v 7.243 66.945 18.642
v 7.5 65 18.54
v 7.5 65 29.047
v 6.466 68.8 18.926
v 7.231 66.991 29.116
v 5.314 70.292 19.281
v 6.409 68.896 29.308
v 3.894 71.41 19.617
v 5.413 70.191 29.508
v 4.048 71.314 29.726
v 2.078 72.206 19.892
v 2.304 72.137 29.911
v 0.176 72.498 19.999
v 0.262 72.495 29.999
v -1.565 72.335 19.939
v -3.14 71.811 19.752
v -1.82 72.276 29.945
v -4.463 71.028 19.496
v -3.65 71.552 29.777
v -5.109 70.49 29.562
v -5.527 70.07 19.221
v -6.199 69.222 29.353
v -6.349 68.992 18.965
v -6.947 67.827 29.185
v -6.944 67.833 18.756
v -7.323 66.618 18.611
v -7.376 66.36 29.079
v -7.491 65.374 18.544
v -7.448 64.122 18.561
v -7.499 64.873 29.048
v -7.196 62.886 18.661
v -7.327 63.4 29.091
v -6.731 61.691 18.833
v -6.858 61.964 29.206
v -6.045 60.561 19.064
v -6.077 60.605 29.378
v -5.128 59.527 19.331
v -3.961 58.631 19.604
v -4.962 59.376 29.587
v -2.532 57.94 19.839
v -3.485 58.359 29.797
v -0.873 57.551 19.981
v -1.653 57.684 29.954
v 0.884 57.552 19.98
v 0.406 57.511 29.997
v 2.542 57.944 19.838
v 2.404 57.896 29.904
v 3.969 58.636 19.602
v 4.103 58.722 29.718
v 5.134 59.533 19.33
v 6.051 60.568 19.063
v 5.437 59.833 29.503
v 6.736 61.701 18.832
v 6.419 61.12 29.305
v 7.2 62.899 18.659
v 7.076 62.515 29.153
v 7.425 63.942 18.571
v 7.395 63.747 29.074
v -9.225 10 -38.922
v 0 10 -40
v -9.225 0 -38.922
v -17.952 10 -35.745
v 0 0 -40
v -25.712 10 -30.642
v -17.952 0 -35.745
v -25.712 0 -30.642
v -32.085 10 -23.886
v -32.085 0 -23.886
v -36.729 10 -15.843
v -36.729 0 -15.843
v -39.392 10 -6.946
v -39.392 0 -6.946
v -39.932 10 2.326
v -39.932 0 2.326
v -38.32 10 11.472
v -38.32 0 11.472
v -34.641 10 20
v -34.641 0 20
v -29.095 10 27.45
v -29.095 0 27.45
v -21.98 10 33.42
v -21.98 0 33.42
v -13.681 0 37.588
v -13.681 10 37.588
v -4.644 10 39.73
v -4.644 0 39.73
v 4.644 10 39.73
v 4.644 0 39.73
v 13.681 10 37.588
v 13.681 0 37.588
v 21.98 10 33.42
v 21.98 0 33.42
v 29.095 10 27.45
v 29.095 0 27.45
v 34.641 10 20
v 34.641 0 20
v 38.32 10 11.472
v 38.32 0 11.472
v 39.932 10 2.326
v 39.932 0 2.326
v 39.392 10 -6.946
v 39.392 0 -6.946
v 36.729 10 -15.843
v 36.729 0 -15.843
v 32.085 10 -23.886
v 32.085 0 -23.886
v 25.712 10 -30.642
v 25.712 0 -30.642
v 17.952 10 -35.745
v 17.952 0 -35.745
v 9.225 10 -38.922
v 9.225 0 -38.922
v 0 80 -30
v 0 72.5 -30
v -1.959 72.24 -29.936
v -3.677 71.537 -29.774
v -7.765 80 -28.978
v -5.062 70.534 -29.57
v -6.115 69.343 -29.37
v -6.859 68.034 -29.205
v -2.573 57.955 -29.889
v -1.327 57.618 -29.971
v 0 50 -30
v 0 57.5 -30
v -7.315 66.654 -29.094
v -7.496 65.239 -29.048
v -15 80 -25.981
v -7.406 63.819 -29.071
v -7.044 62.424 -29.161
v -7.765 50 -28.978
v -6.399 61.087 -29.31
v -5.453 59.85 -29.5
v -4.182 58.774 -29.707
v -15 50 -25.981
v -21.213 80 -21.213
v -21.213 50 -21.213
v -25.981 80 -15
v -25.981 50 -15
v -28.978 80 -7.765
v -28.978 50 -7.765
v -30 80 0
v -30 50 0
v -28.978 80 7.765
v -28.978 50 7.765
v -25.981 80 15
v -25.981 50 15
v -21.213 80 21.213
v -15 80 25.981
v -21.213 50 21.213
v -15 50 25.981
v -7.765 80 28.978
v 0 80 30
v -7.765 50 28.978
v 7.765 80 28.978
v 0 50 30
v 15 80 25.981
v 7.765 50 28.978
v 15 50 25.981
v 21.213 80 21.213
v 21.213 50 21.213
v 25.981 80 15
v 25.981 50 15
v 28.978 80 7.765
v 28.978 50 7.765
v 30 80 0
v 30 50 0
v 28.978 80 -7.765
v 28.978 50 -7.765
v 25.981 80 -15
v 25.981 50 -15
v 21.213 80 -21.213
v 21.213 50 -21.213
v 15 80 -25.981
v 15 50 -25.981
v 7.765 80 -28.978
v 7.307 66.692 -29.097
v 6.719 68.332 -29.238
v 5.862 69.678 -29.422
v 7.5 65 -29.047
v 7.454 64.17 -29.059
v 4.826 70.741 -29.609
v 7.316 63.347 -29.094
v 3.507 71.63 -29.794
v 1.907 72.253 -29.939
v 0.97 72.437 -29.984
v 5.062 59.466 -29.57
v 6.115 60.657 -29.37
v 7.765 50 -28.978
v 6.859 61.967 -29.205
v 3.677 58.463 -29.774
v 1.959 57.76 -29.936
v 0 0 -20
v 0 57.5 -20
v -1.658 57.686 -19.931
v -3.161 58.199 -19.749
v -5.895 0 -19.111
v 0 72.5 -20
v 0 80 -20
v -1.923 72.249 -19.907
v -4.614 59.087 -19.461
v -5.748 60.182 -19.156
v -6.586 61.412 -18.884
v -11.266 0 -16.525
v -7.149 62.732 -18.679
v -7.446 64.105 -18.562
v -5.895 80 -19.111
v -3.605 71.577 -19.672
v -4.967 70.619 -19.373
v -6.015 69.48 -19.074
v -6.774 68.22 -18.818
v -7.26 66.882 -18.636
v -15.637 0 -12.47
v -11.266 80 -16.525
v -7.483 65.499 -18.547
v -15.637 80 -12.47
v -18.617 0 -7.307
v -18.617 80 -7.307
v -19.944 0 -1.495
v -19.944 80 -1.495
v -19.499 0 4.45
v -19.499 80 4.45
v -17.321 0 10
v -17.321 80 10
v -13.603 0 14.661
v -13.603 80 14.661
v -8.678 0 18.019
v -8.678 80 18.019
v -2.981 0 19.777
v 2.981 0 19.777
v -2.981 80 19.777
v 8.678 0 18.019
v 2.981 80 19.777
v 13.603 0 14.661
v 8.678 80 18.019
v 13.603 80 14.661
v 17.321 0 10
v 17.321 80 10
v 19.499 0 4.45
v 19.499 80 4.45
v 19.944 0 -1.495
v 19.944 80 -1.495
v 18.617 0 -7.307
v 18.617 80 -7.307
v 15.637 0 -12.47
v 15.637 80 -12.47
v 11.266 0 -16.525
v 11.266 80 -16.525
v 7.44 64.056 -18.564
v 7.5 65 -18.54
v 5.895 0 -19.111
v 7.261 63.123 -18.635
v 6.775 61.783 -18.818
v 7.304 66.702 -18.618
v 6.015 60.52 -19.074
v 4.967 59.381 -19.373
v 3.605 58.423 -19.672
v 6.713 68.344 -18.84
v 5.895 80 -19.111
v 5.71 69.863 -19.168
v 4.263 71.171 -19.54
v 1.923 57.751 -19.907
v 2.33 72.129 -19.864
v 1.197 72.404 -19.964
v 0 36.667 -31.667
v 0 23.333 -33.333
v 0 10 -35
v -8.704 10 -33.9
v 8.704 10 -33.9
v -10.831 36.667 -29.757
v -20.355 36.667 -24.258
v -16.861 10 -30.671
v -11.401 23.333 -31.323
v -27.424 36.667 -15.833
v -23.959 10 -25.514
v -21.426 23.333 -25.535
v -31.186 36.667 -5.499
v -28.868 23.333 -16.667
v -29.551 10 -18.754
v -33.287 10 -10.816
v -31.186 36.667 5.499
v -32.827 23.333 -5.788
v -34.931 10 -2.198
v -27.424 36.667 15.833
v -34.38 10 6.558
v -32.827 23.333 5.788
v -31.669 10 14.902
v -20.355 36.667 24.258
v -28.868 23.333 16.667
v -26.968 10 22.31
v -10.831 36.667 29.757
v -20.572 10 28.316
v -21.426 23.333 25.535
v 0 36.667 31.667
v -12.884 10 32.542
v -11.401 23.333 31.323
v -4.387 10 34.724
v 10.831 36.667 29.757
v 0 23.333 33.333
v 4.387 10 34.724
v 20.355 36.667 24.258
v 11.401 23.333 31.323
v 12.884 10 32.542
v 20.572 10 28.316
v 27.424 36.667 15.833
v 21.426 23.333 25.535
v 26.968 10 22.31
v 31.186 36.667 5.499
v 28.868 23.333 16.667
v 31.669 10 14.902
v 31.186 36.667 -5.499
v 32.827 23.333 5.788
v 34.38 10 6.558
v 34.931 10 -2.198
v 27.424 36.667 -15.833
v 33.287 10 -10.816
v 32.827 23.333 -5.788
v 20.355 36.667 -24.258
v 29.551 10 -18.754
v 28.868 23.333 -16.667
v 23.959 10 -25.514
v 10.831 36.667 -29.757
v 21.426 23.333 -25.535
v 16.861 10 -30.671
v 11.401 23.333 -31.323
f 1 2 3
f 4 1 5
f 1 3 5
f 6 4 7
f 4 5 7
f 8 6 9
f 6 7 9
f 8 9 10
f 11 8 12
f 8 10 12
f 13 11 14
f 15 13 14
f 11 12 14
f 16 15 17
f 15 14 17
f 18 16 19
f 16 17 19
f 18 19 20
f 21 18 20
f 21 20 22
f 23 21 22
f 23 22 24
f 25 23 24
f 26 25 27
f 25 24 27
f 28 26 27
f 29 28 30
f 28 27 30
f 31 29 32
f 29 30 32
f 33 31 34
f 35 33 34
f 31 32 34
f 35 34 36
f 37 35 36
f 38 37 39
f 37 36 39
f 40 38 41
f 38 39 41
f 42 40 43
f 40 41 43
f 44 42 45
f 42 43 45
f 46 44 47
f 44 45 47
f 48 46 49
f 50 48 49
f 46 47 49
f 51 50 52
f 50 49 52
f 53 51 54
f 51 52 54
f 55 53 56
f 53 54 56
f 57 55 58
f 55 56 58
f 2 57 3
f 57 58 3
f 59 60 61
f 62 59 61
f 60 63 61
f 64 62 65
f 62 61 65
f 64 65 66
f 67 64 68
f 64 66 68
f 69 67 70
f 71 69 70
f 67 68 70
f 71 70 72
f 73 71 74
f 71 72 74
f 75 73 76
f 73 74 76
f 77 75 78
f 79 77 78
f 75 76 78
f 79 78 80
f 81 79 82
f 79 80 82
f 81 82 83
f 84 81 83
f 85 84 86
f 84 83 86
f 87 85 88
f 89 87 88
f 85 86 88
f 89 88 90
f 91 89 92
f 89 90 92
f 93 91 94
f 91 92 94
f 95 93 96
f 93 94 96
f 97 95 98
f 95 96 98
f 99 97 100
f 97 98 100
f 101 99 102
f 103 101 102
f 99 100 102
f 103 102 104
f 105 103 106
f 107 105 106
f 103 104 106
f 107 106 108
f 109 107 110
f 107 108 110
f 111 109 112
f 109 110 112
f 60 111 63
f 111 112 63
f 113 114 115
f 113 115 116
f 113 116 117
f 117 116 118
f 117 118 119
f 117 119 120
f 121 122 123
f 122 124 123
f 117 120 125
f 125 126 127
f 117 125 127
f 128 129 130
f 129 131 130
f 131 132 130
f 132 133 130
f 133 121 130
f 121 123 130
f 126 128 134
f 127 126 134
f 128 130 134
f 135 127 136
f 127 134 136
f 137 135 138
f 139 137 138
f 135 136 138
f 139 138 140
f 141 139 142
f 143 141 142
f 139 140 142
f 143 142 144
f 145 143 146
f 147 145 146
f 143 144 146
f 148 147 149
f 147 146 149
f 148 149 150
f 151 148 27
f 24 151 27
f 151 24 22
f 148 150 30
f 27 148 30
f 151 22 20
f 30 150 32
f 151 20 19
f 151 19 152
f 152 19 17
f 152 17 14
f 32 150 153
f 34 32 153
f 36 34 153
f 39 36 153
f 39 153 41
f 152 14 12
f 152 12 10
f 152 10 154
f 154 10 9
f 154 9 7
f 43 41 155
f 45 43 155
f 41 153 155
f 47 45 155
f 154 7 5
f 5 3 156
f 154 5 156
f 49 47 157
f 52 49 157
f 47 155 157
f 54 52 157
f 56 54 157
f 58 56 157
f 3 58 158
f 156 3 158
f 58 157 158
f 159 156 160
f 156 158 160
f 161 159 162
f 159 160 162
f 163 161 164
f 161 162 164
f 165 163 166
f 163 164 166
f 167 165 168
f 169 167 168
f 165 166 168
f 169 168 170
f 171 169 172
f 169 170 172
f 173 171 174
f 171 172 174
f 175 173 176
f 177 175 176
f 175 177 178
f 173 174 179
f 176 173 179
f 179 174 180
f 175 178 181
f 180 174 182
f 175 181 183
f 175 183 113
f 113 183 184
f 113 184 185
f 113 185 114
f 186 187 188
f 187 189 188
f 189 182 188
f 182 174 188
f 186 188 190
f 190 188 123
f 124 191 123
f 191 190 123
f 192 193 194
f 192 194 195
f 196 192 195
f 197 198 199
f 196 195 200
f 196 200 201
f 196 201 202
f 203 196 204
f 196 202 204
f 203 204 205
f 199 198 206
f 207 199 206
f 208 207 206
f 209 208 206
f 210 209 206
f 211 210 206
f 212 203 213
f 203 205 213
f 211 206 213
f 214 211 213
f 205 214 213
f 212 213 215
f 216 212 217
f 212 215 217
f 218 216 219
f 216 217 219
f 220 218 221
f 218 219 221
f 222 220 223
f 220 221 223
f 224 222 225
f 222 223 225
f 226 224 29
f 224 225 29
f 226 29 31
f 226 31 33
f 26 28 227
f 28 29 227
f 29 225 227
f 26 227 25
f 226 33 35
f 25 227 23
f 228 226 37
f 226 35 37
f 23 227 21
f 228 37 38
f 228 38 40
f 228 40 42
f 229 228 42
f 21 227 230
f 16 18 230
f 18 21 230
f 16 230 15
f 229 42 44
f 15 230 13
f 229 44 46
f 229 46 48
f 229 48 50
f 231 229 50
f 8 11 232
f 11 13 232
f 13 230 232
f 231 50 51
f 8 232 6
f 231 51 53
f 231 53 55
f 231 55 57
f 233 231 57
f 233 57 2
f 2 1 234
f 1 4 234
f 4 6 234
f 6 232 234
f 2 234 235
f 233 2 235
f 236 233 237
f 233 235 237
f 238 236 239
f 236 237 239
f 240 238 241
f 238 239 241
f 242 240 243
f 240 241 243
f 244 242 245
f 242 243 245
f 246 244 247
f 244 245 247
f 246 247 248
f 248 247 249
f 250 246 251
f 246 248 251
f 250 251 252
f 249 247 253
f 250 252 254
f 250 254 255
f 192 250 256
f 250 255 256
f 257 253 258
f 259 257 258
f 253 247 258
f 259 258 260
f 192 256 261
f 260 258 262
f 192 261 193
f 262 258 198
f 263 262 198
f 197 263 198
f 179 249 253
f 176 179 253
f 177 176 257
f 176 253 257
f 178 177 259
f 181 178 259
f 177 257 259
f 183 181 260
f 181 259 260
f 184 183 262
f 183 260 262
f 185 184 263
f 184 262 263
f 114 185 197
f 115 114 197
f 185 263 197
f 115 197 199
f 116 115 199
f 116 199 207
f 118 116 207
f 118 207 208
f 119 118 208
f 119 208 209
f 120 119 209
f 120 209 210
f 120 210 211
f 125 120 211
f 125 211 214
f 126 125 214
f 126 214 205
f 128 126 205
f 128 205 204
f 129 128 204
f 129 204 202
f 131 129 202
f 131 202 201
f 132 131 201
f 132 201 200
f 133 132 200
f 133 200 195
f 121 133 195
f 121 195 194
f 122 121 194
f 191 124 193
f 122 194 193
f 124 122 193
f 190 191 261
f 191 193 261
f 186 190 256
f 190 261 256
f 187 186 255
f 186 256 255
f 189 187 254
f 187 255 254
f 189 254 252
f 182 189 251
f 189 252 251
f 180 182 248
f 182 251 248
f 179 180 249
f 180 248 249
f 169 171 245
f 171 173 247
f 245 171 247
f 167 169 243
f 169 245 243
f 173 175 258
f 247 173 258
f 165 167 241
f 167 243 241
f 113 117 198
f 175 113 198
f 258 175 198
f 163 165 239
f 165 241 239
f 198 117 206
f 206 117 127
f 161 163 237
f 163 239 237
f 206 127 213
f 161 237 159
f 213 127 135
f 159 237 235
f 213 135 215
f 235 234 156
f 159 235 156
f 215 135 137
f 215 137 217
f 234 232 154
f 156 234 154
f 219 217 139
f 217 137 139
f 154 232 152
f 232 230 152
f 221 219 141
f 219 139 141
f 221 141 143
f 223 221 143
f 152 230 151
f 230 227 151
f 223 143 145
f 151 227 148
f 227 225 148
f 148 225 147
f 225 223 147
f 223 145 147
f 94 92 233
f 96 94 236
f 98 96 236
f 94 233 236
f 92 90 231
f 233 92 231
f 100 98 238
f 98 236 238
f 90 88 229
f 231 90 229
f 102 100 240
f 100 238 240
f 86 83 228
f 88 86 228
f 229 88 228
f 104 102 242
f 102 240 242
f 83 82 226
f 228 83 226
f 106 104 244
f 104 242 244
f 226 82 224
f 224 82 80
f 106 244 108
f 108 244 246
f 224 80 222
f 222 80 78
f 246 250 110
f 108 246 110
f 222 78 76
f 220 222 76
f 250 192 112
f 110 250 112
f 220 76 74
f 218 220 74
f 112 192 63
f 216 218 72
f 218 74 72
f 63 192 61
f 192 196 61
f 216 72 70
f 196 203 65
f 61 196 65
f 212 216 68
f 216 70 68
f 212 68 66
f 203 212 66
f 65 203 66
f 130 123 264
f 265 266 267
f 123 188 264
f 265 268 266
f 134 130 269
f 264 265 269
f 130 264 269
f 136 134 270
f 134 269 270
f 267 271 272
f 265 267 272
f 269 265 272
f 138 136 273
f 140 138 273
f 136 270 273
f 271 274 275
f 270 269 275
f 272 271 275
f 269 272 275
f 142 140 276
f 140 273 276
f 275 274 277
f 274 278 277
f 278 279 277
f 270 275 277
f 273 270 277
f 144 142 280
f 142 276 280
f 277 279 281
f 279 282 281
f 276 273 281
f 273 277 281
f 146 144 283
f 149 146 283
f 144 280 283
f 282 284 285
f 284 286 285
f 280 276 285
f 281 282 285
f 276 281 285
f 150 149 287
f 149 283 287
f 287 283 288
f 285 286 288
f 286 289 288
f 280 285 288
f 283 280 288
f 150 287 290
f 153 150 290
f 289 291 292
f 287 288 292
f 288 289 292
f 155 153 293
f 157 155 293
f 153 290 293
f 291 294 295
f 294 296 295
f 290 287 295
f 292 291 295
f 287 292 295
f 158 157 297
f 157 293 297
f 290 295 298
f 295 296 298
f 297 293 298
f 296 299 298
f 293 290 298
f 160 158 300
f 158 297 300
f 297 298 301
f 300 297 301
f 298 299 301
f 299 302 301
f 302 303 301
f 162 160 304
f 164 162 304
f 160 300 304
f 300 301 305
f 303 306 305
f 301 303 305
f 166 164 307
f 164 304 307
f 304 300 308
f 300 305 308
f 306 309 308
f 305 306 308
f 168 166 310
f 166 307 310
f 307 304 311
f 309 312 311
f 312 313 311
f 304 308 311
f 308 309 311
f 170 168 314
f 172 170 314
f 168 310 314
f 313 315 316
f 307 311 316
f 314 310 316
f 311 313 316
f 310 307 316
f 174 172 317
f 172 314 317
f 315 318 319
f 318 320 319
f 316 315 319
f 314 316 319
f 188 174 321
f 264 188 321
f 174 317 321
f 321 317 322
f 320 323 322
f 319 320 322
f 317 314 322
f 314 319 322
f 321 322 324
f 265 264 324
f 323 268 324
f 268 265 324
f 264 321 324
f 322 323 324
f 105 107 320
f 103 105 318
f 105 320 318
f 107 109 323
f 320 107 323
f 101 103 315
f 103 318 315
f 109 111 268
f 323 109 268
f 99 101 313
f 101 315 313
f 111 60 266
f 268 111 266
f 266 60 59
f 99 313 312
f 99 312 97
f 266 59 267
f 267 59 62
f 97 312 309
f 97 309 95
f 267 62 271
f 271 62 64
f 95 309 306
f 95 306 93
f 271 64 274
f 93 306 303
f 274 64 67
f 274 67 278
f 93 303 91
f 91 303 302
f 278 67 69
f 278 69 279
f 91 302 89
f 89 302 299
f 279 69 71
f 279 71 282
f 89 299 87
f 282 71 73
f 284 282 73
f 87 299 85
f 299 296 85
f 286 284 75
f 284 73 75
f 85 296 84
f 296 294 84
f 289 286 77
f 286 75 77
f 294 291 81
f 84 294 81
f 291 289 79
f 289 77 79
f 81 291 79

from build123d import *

# Parameters (mm, degrees)
SKETCH2_R          = 7.5
CUT_EXTRUDE1_DEPTH = 35


with BuildPart() as part:
    # Sketch1 → Revolve1 (revolve)
    with BuildSketch(Plane.XY, mode=Mode.PRIVATE) as revolve1_sk:
        Polygon((20, 0), (20, 80), (30, 80), (30, 50), (35, 10), (40, 10), (40, 0), align=None)
    revolve(revolve1_sk.sketch.rotate(Axis((0, 0, 0), (0, 1, 0)), 90), axis=Axis((0, 0, 0), (0, 1, 0)))

    # Sketch2 → Cut-Extrude1 (cut, symmetric)
    with BuildSketch(Plane.XY):
        with Locations((0, 65)):
            Circle(SKETCH2_R)
    extrude(amount=CUT_EXTRUDE1_DEPTH, both=True, mode=Mode.SUBTRACT)


solid = part.part
